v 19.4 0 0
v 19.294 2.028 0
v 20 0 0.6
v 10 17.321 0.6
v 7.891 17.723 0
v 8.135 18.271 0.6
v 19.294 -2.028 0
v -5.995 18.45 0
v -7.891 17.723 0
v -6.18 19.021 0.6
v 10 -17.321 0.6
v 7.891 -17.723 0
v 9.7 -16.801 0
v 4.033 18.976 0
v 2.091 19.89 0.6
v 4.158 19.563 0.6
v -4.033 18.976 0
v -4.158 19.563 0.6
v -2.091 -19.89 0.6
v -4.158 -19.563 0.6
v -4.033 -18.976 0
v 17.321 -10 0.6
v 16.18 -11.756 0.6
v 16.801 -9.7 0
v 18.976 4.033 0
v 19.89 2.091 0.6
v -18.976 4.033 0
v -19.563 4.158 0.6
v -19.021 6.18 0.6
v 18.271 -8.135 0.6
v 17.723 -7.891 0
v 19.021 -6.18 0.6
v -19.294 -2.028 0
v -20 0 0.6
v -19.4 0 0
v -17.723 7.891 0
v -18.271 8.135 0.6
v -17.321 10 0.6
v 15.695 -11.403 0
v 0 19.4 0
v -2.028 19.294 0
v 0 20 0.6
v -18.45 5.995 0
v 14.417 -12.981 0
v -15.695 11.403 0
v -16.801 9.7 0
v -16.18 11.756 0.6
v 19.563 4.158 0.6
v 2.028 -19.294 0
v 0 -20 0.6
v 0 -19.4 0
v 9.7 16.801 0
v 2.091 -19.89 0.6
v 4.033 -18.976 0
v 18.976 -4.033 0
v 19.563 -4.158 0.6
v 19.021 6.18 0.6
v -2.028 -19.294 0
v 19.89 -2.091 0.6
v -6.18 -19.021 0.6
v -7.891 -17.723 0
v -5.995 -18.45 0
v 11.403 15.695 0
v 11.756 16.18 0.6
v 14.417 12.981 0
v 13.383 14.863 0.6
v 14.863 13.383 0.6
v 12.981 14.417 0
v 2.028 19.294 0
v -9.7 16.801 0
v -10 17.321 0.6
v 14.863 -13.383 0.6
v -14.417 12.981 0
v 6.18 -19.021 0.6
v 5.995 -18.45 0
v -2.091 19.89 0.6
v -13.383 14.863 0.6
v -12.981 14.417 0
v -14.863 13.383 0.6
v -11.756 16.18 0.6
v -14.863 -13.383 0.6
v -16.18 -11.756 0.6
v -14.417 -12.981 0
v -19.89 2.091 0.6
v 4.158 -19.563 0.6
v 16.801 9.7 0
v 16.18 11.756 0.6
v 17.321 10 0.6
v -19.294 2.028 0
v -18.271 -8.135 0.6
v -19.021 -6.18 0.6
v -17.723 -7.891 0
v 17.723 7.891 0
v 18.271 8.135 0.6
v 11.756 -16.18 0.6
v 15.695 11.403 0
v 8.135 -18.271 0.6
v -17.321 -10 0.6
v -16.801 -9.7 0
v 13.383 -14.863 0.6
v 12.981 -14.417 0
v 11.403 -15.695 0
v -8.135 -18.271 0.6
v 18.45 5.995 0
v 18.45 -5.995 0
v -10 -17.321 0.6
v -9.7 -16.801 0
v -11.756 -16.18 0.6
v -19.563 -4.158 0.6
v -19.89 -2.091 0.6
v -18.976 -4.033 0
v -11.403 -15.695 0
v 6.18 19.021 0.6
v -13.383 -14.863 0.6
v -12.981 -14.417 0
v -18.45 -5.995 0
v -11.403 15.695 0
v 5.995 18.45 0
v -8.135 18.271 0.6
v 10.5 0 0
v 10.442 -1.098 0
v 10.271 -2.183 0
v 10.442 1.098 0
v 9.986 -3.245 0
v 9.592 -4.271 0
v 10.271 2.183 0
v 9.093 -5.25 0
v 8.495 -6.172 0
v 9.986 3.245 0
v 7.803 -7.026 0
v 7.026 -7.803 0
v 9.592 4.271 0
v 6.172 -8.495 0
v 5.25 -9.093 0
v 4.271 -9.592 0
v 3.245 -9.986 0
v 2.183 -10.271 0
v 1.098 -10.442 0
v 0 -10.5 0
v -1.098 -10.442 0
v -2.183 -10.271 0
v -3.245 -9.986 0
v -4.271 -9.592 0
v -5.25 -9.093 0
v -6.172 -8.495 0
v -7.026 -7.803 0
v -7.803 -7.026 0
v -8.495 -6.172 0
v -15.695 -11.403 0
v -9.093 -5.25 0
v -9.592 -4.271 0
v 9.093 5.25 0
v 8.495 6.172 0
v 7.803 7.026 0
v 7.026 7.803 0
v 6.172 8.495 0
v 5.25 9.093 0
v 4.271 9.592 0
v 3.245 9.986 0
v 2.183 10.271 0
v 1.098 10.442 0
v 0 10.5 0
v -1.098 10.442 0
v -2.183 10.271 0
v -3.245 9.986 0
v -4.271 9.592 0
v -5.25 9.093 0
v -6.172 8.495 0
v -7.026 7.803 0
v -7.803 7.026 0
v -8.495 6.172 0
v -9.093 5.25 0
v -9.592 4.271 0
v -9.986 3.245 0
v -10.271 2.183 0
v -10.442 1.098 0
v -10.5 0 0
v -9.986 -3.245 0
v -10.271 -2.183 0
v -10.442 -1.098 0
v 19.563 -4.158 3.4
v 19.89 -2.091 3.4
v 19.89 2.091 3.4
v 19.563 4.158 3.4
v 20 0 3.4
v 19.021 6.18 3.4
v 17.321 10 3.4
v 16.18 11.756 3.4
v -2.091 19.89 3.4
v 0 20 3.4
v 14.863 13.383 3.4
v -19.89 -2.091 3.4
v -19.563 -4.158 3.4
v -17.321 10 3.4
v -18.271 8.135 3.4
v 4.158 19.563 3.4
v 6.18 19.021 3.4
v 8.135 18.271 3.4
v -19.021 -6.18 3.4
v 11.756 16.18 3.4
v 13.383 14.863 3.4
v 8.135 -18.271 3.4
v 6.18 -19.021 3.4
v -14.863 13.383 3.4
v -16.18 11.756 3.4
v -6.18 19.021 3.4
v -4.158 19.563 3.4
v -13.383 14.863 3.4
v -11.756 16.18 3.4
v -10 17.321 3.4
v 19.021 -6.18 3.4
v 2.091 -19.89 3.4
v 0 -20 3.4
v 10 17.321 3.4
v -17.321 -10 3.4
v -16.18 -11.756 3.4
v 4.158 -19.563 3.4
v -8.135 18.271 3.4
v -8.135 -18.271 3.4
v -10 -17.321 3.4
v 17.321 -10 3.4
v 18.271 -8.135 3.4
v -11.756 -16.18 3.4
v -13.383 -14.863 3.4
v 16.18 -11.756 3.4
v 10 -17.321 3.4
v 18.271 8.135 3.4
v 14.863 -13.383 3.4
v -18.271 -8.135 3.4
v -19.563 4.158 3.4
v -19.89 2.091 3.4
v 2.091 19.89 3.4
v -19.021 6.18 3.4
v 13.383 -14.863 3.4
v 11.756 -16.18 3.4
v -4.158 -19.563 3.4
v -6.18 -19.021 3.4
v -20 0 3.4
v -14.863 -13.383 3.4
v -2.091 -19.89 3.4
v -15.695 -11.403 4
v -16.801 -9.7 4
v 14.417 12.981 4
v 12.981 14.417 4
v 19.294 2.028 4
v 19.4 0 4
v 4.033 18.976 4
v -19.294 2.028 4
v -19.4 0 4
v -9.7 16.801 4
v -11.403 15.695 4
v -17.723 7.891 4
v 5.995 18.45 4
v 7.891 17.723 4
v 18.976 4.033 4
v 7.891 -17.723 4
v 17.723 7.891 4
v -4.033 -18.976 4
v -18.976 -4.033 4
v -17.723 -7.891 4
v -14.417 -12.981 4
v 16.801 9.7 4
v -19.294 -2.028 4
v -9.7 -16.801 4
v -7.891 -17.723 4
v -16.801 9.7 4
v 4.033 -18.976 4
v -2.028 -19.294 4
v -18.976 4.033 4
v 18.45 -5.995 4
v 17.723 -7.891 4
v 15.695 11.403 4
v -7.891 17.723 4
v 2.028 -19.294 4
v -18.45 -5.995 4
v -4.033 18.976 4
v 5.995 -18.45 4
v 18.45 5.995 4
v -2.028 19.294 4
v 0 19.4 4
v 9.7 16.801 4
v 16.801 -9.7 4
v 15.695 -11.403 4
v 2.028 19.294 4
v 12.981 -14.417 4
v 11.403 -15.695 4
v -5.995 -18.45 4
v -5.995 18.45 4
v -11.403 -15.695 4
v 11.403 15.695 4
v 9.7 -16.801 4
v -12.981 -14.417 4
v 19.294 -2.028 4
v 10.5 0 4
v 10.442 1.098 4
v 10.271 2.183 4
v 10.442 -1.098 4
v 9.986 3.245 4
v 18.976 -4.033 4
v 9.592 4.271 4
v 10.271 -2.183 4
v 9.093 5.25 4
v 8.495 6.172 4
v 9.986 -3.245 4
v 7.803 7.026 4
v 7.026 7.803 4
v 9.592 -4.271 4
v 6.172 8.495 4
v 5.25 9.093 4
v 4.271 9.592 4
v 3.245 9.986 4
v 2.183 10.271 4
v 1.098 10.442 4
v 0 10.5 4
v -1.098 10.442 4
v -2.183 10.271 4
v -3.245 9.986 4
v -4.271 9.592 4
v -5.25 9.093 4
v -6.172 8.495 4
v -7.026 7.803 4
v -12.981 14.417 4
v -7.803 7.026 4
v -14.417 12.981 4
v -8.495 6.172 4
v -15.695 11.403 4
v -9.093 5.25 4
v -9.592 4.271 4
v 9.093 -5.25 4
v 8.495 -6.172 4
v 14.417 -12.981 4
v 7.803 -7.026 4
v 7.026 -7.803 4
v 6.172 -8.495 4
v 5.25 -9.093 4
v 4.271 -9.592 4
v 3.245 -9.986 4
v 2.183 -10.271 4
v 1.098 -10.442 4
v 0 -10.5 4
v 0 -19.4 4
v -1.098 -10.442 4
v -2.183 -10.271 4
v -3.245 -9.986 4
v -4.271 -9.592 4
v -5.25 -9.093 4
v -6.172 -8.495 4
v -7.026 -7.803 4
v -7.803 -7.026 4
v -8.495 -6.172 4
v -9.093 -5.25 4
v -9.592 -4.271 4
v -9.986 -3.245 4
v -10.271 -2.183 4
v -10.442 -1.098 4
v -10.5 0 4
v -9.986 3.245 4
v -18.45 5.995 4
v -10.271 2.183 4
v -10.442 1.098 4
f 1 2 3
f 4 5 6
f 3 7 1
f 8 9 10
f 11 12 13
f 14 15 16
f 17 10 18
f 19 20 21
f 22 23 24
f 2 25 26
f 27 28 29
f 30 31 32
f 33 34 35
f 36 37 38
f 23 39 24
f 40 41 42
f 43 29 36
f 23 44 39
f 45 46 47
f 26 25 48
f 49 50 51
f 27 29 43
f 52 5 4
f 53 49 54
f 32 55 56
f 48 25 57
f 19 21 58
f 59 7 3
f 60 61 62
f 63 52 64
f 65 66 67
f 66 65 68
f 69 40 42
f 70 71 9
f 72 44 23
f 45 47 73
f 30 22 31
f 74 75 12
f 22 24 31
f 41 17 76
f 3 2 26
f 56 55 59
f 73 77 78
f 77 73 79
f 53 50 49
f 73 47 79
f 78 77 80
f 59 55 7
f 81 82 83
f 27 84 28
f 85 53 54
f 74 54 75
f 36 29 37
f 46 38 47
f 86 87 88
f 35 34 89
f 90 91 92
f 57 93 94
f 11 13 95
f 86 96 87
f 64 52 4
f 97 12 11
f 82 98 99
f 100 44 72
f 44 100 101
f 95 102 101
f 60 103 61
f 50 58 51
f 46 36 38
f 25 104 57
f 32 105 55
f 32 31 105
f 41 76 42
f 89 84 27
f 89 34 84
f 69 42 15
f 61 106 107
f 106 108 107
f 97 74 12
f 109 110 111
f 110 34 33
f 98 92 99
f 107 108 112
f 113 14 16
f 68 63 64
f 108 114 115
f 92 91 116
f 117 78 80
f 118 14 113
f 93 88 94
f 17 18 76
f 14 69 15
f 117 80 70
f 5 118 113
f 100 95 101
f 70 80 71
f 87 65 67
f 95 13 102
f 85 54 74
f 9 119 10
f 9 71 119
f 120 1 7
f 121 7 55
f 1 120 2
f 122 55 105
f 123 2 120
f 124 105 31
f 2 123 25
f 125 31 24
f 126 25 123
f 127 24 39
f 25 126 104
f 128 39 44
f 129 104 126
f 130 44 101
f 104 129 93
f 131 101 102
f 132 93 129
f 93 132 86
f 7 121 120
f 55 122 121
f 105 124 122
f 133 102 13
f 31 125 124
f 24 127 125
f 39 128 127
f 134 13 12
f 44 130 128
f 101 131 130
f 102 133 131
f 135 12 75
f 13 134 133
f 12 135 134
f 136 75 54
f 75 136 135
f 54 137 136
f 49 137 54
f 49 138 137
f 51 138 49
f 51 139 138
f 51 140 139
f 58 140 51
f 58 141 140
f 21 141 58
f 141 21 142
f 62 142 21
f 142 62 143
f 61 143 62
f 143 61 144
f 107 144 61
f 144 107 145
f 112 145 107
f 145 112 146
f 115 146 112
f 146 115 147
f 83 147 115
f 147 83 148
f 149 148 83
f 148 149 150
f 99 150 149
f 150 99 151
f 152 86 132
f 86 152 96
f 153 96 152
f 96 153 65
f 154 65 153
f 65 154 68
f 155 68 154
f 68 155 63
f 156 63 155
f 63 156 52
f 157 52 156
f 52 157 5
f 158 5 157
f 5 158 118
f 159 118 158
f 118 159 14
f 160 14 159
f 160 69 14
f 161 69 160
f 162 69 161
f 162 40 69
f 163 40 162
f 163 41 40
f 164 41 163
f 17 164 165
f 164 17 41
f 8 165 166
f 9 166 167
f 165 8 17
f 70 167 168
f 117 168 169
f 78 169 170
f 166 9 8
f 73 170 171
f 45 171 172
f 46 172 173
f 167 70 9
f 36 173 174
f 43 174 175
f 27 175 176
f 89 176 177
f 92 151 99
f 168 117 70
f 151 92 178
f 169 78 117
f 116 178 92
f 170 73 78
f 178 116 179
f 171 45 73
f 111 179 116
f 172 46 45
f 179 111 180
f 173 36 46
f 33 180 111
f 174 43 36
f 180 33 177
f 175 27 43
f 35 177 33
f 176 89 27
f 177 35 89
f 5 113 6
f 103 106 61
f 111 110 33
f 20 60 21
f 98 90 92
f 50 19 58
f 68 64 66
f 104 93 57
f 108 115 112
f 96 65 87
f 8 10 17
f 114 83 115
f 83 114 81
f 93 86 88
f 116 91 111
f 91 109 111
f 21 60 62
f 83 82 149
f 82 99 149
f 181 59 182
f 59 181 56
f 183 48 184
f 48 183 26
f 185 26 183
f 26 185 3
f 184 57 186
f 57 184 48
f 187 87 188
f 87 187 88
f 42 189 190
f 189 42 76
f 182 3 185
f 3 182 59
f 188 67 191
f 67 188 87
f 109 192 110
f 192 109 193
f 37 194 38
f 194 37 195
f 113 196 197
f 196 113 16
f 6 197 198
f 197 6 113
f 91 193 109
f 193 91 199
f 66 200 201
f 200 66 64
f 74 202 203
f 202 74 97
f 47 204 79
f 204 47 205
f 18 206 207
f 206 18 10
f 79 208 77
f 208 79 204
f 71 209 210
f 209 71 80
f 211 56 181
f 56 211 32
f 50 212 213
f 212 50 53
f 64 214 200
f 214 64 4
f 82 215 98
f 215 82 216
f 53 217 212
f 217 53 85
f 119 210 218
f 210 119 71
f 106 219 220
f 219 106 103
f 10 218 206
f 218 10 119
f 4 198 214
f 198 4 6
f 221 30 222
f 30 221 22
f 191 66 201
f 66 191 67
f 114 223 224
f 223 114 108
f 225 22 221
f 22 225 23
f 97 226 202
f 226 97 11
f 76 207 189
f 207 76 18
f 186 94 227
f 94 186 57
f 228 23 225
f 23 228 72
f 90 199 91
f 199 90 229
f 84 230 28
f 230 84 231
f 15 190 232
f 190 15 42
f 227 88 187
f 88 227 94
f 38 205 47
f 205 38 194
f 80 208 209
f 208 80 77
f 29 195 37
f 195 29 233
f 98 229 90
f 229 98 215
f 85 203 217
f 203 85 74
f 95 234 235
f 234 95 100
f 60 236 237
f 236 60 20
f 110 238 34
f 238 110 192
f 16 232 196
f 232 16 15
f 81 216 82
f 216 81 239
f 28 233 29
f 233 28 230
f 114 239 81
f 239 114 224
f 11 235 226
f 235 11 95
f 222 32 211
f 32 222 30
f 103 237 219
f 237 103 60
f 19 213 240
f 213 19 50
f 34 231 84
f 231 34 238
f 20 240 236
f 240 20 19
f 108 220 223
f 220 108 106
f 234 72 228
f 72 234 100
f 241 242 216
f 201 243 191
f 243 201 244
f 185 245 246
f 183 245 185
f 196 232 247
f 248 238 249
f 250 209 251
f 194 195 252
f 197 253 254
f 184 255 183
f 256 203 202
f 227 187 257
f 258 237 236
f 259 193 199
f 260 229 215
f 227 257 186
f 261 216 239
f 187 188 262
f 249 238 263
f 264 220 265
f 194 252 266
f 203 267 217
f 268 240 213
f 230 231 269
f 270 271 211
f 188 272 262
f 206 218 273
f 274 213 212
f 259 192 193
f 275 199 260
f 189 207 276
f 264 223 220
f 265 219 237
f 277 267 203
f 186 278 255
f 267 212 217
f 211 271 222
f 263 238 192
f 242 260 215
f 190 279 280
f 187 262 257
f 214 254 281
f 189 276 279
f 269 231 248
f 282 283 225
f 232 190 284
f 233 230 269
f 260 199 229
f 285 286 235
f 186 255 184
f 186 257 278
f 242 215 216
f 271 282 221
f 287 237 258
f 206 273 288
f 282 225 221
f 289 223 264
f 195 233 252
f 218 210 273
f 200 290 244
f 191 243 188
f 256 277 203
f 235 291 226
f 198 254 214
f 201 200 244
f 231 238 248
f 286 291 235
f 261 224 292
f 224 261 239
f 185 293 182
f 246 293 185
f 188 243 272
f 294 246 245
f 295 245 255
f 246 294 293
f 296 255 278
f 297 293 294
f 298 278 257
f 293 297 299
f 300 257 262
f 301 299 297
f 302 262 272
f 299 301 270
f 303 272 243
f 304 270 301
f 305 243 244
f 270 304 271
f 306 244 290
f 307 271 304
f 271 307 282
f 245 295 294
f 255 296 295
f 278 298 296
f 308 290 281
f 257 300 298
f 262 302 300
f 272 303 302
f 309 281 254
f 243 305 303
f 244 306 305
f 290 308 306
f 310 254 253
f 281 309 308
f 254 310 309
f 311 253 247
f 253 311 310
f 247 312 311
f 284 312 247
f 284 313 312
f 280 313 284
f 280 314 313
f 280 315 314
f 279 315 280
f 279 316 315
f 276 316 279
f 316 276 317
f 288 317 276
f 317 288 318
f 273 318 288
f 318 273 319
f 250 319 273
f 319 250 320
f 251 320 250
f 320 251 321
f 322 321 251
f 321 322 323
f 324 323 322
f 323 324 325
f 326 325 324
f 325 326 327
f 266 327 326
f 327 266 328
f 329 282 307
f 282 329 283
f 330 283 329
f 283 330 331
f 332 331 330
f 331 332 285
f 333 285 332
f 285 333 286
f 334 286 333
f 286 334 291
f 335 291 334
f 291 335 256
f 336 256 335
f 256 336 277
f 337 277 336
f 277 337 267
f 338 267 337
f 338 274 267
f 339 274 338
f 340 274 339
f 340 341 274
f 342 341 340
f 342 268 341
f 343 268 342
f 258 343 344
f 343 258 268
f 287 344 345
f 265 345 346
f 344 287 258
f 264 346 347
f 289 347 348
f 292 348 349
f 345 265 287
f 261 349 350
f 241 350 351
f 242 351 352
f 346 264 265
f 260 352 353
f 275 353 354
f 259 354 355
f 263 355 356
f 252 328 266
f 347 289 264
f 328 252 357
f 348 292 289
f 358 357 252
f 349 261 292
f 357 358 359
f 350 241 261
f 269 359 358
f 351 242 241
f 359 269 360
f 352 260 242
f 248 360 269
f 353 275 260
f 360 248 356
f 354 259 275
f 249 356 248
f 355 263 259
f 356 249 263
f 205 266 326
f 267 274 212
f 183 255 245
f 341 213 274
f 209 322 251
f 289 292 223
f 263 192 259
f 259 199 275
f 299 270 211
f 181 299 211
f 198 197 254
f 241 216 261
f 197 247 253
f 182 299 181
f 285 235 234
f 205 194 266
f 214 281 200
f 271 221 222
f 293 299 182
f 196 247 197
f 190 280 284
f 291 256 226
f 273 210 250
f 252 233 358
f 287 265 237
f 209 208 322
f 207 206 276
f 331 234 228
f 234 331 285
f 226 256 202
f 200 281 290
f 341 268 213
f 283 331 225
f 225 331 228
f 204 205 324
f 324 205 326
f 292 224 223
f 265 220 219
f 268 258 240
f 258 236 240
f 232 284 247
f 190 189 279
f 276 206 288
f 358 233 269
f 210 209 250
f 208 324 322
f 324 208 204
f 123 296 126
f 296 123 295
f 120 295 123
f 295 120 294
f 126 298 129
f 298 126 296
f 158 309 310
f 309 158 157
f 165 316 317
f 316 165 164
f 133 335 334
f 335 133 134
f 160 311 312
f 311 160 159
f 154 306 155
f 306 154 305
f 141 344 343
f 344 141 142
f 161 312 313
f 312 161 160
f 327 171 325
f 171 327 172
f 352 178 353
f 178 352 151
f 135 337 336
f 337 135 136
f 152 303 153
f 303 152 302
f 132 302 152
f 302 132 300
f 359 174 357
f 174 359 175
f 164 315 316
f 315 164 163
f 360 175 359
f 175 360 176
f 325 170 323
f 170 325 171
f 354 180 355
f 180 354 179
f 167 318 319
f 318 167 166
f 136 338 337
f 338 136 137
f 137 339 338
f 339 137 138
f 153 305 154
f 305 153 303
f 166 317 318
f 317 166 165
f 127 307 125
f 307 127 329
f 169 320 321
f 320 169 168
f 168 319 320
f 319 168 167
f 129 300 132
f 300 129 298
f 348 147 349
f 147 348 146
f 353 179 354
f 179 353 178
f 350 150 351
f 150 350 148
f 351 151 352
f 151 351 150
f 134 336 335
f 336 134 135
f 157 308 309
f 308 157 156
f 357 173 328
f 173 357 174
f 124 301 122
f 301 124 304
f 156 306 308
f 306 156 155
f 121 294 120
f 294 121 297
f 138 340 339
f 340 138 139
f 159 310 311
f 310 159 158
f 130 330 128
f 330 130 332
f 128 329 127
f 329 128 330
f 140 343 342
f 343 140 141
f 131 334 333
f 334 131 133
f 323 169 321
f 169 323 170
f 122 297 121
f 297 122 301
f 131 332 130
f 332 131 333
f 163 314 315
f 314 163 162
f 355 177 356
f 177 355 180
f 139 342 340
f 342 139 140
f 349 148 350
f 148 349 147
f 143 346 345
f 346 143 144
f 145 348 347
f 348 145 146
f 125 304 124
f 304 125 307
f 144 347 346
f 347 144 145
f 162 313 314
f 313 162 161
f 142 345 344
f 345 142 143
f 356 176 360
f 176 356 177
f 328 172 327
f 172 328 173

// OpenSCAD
// Chamfered metric washer.
$fn = 60;
eps = 0.02;
inner_d = 21;
outer_d = 40;
thickness = 4;
chamfer = 0.6;
difference() {
    union() {
        cylinder(d1 = outer_d - 2 * chamfer, d2 = outer_d, h = chamfer);
        translate([0, 0, chamfer]) cylinder(d = outer_d, h = thickness - 2 * chamfer);
        translate([0, 0, thickness - chamfer]) cylinder(d1 = outer_d, d2 = outer_d - 2 * chamfer, h = chamfer);
    }
    translate([0, 0, -eps]) cylinder(d = inner_d, h = thickness + 2 * eps);
}
